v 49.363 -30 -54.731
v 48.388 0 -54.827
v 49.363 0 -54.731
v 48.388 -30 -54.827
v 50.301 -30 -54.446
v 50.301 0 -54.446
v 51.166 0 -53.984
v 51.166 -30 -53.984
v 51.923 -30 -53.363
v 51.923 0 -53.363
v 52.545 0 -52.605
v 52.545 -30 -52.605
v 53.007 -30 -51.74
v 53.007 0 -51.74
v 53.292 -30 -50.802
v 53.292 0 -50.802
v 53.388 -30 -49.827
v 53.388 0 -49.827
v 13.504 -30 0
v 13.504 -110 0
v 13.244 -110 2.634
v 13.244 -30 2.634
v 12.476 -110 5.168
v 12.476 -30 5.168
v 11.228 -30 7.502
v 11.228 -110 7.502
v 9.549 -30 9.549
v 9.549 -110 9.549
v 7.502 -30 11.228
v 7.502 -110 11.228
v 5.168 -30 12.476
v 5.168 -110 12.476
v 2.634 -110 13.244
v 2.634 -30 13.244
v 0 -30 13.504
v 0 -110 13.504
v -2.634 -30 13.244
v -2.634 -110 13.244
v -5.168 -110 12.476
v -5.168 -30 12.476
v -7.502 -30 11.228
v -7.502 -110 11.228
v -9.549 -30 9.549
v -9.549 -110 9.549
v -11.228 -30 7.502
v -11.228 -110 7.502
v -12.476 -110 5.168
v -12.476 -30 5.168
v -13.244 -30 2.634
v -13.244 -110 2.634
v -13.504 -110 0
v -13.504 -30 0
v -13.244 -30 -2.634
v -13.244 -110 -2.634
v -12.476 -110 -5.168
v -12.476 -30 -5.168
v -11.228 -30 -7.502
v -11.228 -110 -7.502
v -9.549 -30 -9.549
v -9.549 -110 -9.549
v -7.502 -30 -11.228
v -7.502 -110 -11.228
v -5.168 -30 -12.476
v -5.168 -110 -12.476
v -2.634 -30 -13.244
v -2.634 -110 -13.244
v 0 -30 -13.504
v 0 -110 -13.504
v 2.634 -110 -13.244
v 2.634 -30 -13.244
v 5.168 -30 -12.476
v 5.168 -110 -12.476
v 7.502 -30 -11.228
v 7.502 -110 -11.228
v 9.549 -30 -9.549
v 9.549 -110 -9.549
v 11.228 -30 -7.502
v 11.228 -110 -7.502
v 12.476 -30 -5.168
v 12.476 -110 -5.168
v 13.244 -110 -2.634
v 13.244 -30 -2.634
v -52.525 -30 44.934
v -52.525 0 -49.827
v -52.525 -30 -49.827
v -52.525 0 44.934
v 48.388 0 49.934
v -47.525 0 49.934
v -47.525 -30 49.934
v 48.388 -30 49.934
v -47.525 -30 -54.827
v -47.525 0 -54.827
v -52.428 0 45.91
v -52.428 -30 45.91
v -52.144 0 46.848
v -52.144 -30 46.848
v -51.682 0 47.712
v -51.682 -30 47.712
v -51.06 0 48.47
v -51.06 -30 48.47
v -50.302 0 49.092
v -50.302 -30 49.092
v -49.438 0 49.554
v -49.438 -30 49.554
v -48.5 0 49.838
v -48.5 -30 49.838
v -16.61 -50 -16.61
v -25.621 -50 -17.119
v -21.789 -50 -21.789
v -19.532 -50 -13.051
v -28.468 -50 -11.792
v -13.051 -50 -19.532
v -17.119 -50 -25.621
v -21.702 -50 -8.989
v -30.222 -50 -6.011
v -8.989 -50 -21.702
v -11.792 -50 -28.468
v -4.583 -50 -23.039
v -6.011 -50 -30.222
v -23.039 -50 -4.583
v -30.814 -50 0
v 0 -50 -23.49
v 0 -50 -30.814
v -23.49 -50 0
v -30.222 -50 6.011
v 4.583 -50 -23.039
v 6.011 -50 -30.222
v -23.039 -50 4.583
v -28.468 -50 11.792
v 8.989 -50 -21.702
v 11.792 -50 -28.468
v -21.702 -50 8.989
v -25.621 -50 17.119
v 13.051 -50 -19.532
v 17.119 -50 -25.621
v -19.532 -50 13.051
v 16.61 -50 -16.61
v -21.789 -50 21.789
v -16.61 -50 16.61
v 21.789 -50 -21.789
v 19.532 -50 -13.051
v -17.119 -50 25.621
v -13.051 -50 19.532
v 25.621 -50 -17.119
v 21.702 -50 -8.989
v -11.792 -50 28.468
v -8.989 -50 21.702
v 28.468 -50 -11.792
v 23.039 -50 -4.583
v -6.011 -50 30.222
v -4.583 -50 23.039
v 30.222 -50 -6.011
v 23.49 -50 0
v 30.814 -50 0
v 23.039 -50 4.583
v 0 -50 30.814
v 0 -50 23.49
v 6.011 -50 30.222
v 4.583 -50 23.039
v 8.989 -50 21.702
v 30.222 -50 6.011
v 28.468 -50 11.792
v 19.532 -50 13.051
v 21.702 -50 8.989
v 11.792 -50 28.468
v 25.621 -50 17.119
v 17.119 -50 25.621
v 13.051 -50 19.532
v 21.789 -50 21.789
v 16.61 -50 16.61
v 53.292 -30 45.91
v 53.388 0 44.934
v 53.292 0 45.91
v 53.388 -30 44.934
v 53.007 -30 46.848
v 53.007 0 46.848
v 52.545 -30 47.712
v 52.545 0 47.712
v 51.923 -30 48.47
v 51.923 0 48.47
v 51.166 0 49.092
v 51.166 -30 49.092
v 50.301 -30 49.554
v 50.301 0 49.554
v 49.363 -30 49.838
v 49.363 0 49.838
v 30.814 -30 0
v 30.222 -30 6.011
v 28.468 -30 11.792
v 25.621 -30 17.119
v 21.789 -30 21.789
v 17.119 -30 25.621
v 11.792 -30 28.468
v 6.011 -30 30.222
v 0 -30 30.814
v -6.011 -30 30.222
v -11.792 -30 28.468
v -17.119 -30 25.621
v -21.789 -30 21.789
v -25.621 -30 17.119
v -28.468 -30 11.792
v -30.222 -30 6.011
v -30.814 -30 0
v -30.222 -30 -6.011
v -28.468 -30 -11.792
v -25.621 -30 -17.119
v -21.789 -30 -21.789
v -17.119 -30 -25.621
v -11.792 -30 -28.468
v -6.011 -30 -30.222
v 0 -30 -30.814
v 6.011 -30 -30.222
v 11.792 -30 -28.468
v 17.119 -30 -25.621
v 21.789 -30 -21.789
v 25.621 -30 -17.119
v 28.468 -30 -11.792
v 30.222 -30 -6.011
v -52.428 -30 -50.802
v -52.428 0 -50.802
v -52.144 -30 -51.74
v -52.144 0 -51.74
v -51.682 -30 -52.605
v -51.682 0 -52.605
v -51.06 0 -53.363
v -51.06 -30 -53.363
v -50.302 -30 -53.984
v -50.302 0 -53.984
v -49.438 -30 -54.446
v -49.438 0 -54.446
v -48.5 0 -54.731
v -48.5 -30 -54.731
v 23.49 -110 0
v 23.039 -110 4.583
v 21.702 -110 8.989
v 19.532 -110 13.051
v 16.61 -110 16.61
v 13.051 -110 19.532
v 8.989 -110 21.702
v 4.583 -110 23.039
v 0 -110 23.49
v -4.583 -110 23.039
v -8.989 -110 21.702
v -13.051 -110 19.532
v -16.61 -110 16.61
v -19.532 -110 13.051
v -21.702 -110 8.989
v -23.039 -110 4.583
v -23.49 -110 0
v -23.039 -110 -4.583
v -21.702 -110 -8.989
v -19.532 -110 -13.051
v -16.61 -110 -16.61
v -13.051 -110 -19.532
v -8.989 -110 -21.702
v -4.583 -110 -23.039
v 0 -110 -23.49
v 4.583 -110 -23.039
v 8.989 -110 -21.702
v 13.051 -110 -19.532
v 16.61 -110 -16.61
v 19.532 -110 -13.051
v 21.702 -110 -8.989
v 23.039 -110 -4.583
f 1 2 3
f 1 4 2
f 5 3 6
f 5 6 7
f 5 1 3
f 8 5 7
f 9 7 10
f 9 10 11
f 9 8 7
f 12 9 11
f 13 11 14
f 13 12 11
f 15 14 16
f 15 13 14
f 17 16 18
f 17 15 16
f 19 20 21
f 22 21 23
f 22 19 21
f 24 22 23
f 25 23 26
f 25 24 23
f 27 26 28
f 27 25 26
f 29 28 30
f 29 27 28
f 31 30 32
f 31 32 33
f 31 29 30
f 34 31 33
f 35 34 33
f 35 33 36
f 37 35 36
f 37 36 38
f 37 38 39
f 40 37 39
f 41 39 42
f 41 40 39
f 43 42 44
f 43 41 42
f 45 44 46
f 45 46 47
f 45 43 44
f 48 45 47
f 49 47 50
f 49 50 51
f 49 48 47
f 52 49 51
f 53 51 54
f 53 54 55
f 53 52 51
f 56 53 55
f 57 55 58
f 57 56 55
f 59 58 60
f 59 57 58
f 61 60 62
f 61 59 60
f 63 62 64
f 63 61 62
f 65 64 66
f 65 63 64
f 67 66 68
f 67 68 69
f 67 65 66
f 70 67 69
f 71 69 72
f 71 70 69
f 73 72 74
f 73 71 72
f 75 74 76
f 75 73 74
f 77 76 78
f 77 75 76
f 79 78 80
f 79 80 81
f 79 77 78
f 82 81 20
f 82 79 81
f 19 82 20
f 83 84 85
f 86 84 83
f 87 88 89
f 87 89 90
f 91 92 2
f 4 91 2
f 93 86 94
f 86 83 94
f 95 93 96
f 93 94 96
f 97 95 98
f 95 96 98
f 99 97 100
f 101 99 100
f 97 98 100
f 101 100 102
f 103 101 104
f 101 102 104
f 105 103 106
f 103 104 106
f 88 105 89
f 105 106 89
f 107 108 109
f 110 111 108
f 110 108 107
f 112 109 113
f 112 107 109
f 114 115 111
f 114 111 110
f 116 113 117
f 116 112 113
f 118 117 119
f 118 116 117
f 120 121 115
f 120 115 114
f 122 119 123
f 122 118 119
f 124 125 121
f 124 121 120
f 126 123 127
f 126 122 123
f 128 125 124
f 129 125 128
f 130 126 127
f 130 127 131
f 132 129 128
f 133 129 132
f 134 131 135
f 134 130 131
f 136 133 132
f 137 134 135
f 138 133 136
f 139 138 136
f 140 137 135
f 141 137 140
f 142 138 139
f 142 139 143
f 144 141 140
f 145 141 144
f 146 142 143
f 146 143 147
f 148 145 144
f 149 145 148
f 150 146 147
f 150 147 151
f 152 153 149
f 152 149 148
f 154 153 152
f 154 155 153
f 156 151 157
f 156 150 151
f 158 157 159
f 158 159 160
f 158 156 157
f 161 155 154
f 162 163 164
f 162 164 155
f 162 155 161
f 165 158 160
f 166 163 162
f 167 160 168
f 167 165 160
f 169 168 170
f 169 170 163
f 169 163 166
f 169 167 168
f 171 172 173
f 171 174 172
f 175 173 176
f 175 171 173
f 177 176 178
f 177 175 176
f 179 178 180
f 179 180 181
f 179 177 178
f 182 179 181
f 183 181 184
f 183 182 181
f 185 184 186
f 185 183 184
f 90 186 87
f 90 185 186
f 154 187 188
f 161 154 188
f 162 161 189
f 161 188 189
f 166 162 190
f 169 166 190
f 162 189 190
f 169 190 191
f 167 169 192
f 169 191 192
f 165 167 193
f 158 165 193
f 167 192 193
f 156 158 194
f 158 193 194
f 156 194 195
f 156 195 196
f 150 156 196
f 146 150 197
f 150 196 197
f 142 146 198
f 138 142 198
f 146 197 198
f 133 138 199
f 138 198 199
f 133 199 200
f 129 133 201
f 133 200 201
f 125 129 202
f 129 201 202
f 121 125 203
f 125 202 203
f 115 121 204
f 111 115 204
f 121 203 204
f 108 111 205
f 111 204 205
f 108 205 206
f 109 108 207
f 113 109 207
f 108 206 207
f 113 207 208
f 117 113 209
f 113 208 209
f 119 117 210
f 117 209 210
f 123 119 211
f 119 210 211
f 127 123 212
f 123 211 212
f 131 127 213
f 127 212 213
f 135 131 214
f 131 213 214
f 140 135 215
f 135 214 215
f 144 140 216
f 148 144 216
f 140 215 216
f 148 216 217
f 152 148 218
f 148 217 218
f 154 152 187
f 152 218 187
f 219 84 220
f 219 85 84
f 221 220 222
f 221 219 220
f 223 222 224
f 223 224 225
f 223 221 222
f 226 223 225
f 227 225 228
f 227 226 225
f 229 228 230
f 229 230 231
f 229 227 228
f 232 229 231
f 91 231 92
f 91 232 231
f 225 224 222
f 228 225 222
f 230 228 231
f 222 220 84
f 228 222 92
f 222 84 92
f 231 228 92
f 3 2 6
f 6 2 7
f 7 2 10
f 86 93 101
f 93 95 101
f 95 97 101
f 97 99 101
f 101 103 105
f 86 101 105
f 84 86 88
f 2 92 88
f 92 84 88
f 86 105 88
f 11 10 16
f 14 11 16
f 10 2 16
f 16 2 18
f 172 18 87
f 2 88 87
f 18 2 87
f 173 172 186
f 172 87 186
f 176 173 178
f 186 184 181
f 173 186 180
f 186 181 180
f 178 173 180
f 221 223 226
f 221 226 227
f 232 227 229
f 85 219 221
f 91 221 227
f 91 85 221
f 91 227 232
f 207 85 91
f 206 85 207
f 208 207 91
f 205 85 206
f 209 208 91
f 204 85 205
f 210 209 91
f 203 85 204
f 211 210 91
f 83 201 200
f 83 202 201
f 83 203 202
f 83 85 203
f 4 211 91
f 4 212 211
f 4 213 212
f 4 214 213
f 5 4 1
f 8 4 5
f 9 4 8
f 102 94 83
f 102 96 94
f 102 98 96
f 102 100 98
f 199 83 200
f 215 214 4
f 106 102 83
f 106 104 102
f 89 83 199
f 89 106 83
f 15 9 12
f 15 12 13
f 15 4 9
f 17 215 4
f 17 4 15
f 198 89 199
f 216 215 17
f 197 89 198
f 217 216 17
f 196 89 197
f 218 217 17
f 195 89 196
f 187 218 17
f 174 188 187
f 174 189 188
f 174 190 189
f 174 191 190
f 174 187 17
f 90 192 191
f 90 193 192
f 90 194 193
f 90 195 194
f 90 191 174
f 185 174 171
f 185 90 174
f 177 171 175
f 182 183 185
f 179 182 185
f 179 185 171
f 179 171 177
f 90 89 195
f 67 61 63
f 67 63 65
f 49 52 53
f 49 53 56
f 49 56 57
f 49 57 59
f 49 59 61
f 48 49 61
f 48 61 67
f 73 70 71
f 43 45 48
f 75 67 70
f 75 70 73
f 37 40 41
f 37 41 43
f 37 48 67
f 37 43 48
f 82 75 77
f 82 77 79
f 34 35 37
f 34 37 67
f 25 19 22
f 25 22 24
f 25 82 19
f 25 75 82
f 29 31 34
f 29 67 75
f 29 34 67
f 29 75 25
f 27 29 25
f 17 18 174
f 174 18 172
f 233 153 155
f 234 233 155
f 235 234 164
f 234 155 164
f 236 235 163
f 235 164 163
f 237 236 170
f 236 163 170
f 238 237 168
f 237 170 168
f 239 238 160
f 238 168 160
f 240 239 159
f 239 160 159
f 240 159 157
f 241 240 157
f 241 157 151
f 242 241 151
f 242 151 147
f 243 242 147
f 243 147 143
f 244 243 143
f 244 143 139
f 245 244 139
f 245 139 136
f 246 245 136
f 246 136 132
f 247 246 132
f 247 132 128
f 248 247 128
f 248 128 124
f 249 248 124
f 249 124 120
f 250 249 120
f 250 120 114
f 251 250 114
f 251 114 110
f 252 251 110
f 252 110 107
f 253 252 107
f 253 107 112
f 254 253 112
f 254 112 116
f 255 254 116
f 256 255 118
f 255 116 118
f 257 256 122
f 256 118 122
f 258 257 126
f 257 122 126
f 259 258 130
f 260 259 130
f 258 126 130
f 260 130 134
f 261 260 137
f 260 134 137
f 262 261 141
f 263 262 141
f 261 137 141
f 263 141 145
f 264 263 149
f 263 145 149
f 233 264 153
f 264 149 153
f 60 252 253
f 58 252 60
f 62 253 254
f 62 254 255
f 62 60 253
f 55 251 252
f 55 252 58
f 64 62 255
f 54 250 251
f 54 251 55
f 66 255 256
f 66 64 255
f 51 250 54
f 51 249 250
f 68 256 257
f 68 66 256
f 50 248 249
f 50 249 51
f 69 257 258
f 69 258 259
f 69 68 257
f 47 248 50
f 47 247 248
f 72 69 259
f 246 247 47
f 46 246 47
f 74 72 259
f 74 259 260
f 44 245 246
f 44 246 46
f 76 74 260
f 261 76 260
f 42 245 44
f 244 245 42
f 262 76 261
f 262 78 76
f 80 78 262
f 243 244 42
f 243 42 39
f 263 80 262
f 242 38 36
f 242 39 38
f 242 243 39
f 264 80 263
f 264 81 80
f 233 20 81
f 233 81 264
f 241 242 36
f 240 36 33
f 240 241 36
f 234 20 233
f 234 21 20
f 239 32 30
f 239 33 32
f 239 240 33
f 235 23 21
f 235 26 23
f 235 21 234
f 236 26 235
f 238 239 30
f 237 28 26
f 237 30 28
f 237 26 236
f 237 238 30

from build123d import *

# Parameters (mm, degrees)
F0_W     = 105.912518
F0_H     = 104.761295
F1_DEPTH = 30
F2_R     = 5
F3_R     = 30.813713
F3_R_2   = 23.380782
F4_DEPTH = 20
F5_R     = 23.490351
F5_R_2   = 13.503853
F6_DEPTH = 80


with BuildPart() as f1:
    # F0 (on Front) → F1 (new body)
    with BuildSketch(Plane.XZ):
        with Locations((0.431707, -2.446345)):
            Rectangle(F0_W, F0_H)
    extrude(amount=F1_DEPTH)

    # F2
    f2_edges = [f1.edges().sort_by_distance(p)[0] for p in [
        (53.387966, -15, 49.934302),
        (53.387966, -15, -54.826993),
        (-52.524552, -15, 49.934302),
        (-52.524552, -15, -54.826993),
    ]]
    fillet(f2_edges, radius=F2_R)

    # F3 (on face) → F4 (join)
    with BuildSketch(Plane.XZ.offset(30)):
        Circle(F3_R)
        Circle(F3_R_2, mode=Mode.SUBTRACT)
    extrude(amount=F4_DEPTH)

    # F5 (on face) → F6 (join)
    with BuildSketch(Plane.XZ.offset(30)):
        Circle(F5_R)
        Circle(F5_R_2, mode=Mode.SUBTRACT)
    extrude(amount=F6_DEPTH)


solid = f1.part
